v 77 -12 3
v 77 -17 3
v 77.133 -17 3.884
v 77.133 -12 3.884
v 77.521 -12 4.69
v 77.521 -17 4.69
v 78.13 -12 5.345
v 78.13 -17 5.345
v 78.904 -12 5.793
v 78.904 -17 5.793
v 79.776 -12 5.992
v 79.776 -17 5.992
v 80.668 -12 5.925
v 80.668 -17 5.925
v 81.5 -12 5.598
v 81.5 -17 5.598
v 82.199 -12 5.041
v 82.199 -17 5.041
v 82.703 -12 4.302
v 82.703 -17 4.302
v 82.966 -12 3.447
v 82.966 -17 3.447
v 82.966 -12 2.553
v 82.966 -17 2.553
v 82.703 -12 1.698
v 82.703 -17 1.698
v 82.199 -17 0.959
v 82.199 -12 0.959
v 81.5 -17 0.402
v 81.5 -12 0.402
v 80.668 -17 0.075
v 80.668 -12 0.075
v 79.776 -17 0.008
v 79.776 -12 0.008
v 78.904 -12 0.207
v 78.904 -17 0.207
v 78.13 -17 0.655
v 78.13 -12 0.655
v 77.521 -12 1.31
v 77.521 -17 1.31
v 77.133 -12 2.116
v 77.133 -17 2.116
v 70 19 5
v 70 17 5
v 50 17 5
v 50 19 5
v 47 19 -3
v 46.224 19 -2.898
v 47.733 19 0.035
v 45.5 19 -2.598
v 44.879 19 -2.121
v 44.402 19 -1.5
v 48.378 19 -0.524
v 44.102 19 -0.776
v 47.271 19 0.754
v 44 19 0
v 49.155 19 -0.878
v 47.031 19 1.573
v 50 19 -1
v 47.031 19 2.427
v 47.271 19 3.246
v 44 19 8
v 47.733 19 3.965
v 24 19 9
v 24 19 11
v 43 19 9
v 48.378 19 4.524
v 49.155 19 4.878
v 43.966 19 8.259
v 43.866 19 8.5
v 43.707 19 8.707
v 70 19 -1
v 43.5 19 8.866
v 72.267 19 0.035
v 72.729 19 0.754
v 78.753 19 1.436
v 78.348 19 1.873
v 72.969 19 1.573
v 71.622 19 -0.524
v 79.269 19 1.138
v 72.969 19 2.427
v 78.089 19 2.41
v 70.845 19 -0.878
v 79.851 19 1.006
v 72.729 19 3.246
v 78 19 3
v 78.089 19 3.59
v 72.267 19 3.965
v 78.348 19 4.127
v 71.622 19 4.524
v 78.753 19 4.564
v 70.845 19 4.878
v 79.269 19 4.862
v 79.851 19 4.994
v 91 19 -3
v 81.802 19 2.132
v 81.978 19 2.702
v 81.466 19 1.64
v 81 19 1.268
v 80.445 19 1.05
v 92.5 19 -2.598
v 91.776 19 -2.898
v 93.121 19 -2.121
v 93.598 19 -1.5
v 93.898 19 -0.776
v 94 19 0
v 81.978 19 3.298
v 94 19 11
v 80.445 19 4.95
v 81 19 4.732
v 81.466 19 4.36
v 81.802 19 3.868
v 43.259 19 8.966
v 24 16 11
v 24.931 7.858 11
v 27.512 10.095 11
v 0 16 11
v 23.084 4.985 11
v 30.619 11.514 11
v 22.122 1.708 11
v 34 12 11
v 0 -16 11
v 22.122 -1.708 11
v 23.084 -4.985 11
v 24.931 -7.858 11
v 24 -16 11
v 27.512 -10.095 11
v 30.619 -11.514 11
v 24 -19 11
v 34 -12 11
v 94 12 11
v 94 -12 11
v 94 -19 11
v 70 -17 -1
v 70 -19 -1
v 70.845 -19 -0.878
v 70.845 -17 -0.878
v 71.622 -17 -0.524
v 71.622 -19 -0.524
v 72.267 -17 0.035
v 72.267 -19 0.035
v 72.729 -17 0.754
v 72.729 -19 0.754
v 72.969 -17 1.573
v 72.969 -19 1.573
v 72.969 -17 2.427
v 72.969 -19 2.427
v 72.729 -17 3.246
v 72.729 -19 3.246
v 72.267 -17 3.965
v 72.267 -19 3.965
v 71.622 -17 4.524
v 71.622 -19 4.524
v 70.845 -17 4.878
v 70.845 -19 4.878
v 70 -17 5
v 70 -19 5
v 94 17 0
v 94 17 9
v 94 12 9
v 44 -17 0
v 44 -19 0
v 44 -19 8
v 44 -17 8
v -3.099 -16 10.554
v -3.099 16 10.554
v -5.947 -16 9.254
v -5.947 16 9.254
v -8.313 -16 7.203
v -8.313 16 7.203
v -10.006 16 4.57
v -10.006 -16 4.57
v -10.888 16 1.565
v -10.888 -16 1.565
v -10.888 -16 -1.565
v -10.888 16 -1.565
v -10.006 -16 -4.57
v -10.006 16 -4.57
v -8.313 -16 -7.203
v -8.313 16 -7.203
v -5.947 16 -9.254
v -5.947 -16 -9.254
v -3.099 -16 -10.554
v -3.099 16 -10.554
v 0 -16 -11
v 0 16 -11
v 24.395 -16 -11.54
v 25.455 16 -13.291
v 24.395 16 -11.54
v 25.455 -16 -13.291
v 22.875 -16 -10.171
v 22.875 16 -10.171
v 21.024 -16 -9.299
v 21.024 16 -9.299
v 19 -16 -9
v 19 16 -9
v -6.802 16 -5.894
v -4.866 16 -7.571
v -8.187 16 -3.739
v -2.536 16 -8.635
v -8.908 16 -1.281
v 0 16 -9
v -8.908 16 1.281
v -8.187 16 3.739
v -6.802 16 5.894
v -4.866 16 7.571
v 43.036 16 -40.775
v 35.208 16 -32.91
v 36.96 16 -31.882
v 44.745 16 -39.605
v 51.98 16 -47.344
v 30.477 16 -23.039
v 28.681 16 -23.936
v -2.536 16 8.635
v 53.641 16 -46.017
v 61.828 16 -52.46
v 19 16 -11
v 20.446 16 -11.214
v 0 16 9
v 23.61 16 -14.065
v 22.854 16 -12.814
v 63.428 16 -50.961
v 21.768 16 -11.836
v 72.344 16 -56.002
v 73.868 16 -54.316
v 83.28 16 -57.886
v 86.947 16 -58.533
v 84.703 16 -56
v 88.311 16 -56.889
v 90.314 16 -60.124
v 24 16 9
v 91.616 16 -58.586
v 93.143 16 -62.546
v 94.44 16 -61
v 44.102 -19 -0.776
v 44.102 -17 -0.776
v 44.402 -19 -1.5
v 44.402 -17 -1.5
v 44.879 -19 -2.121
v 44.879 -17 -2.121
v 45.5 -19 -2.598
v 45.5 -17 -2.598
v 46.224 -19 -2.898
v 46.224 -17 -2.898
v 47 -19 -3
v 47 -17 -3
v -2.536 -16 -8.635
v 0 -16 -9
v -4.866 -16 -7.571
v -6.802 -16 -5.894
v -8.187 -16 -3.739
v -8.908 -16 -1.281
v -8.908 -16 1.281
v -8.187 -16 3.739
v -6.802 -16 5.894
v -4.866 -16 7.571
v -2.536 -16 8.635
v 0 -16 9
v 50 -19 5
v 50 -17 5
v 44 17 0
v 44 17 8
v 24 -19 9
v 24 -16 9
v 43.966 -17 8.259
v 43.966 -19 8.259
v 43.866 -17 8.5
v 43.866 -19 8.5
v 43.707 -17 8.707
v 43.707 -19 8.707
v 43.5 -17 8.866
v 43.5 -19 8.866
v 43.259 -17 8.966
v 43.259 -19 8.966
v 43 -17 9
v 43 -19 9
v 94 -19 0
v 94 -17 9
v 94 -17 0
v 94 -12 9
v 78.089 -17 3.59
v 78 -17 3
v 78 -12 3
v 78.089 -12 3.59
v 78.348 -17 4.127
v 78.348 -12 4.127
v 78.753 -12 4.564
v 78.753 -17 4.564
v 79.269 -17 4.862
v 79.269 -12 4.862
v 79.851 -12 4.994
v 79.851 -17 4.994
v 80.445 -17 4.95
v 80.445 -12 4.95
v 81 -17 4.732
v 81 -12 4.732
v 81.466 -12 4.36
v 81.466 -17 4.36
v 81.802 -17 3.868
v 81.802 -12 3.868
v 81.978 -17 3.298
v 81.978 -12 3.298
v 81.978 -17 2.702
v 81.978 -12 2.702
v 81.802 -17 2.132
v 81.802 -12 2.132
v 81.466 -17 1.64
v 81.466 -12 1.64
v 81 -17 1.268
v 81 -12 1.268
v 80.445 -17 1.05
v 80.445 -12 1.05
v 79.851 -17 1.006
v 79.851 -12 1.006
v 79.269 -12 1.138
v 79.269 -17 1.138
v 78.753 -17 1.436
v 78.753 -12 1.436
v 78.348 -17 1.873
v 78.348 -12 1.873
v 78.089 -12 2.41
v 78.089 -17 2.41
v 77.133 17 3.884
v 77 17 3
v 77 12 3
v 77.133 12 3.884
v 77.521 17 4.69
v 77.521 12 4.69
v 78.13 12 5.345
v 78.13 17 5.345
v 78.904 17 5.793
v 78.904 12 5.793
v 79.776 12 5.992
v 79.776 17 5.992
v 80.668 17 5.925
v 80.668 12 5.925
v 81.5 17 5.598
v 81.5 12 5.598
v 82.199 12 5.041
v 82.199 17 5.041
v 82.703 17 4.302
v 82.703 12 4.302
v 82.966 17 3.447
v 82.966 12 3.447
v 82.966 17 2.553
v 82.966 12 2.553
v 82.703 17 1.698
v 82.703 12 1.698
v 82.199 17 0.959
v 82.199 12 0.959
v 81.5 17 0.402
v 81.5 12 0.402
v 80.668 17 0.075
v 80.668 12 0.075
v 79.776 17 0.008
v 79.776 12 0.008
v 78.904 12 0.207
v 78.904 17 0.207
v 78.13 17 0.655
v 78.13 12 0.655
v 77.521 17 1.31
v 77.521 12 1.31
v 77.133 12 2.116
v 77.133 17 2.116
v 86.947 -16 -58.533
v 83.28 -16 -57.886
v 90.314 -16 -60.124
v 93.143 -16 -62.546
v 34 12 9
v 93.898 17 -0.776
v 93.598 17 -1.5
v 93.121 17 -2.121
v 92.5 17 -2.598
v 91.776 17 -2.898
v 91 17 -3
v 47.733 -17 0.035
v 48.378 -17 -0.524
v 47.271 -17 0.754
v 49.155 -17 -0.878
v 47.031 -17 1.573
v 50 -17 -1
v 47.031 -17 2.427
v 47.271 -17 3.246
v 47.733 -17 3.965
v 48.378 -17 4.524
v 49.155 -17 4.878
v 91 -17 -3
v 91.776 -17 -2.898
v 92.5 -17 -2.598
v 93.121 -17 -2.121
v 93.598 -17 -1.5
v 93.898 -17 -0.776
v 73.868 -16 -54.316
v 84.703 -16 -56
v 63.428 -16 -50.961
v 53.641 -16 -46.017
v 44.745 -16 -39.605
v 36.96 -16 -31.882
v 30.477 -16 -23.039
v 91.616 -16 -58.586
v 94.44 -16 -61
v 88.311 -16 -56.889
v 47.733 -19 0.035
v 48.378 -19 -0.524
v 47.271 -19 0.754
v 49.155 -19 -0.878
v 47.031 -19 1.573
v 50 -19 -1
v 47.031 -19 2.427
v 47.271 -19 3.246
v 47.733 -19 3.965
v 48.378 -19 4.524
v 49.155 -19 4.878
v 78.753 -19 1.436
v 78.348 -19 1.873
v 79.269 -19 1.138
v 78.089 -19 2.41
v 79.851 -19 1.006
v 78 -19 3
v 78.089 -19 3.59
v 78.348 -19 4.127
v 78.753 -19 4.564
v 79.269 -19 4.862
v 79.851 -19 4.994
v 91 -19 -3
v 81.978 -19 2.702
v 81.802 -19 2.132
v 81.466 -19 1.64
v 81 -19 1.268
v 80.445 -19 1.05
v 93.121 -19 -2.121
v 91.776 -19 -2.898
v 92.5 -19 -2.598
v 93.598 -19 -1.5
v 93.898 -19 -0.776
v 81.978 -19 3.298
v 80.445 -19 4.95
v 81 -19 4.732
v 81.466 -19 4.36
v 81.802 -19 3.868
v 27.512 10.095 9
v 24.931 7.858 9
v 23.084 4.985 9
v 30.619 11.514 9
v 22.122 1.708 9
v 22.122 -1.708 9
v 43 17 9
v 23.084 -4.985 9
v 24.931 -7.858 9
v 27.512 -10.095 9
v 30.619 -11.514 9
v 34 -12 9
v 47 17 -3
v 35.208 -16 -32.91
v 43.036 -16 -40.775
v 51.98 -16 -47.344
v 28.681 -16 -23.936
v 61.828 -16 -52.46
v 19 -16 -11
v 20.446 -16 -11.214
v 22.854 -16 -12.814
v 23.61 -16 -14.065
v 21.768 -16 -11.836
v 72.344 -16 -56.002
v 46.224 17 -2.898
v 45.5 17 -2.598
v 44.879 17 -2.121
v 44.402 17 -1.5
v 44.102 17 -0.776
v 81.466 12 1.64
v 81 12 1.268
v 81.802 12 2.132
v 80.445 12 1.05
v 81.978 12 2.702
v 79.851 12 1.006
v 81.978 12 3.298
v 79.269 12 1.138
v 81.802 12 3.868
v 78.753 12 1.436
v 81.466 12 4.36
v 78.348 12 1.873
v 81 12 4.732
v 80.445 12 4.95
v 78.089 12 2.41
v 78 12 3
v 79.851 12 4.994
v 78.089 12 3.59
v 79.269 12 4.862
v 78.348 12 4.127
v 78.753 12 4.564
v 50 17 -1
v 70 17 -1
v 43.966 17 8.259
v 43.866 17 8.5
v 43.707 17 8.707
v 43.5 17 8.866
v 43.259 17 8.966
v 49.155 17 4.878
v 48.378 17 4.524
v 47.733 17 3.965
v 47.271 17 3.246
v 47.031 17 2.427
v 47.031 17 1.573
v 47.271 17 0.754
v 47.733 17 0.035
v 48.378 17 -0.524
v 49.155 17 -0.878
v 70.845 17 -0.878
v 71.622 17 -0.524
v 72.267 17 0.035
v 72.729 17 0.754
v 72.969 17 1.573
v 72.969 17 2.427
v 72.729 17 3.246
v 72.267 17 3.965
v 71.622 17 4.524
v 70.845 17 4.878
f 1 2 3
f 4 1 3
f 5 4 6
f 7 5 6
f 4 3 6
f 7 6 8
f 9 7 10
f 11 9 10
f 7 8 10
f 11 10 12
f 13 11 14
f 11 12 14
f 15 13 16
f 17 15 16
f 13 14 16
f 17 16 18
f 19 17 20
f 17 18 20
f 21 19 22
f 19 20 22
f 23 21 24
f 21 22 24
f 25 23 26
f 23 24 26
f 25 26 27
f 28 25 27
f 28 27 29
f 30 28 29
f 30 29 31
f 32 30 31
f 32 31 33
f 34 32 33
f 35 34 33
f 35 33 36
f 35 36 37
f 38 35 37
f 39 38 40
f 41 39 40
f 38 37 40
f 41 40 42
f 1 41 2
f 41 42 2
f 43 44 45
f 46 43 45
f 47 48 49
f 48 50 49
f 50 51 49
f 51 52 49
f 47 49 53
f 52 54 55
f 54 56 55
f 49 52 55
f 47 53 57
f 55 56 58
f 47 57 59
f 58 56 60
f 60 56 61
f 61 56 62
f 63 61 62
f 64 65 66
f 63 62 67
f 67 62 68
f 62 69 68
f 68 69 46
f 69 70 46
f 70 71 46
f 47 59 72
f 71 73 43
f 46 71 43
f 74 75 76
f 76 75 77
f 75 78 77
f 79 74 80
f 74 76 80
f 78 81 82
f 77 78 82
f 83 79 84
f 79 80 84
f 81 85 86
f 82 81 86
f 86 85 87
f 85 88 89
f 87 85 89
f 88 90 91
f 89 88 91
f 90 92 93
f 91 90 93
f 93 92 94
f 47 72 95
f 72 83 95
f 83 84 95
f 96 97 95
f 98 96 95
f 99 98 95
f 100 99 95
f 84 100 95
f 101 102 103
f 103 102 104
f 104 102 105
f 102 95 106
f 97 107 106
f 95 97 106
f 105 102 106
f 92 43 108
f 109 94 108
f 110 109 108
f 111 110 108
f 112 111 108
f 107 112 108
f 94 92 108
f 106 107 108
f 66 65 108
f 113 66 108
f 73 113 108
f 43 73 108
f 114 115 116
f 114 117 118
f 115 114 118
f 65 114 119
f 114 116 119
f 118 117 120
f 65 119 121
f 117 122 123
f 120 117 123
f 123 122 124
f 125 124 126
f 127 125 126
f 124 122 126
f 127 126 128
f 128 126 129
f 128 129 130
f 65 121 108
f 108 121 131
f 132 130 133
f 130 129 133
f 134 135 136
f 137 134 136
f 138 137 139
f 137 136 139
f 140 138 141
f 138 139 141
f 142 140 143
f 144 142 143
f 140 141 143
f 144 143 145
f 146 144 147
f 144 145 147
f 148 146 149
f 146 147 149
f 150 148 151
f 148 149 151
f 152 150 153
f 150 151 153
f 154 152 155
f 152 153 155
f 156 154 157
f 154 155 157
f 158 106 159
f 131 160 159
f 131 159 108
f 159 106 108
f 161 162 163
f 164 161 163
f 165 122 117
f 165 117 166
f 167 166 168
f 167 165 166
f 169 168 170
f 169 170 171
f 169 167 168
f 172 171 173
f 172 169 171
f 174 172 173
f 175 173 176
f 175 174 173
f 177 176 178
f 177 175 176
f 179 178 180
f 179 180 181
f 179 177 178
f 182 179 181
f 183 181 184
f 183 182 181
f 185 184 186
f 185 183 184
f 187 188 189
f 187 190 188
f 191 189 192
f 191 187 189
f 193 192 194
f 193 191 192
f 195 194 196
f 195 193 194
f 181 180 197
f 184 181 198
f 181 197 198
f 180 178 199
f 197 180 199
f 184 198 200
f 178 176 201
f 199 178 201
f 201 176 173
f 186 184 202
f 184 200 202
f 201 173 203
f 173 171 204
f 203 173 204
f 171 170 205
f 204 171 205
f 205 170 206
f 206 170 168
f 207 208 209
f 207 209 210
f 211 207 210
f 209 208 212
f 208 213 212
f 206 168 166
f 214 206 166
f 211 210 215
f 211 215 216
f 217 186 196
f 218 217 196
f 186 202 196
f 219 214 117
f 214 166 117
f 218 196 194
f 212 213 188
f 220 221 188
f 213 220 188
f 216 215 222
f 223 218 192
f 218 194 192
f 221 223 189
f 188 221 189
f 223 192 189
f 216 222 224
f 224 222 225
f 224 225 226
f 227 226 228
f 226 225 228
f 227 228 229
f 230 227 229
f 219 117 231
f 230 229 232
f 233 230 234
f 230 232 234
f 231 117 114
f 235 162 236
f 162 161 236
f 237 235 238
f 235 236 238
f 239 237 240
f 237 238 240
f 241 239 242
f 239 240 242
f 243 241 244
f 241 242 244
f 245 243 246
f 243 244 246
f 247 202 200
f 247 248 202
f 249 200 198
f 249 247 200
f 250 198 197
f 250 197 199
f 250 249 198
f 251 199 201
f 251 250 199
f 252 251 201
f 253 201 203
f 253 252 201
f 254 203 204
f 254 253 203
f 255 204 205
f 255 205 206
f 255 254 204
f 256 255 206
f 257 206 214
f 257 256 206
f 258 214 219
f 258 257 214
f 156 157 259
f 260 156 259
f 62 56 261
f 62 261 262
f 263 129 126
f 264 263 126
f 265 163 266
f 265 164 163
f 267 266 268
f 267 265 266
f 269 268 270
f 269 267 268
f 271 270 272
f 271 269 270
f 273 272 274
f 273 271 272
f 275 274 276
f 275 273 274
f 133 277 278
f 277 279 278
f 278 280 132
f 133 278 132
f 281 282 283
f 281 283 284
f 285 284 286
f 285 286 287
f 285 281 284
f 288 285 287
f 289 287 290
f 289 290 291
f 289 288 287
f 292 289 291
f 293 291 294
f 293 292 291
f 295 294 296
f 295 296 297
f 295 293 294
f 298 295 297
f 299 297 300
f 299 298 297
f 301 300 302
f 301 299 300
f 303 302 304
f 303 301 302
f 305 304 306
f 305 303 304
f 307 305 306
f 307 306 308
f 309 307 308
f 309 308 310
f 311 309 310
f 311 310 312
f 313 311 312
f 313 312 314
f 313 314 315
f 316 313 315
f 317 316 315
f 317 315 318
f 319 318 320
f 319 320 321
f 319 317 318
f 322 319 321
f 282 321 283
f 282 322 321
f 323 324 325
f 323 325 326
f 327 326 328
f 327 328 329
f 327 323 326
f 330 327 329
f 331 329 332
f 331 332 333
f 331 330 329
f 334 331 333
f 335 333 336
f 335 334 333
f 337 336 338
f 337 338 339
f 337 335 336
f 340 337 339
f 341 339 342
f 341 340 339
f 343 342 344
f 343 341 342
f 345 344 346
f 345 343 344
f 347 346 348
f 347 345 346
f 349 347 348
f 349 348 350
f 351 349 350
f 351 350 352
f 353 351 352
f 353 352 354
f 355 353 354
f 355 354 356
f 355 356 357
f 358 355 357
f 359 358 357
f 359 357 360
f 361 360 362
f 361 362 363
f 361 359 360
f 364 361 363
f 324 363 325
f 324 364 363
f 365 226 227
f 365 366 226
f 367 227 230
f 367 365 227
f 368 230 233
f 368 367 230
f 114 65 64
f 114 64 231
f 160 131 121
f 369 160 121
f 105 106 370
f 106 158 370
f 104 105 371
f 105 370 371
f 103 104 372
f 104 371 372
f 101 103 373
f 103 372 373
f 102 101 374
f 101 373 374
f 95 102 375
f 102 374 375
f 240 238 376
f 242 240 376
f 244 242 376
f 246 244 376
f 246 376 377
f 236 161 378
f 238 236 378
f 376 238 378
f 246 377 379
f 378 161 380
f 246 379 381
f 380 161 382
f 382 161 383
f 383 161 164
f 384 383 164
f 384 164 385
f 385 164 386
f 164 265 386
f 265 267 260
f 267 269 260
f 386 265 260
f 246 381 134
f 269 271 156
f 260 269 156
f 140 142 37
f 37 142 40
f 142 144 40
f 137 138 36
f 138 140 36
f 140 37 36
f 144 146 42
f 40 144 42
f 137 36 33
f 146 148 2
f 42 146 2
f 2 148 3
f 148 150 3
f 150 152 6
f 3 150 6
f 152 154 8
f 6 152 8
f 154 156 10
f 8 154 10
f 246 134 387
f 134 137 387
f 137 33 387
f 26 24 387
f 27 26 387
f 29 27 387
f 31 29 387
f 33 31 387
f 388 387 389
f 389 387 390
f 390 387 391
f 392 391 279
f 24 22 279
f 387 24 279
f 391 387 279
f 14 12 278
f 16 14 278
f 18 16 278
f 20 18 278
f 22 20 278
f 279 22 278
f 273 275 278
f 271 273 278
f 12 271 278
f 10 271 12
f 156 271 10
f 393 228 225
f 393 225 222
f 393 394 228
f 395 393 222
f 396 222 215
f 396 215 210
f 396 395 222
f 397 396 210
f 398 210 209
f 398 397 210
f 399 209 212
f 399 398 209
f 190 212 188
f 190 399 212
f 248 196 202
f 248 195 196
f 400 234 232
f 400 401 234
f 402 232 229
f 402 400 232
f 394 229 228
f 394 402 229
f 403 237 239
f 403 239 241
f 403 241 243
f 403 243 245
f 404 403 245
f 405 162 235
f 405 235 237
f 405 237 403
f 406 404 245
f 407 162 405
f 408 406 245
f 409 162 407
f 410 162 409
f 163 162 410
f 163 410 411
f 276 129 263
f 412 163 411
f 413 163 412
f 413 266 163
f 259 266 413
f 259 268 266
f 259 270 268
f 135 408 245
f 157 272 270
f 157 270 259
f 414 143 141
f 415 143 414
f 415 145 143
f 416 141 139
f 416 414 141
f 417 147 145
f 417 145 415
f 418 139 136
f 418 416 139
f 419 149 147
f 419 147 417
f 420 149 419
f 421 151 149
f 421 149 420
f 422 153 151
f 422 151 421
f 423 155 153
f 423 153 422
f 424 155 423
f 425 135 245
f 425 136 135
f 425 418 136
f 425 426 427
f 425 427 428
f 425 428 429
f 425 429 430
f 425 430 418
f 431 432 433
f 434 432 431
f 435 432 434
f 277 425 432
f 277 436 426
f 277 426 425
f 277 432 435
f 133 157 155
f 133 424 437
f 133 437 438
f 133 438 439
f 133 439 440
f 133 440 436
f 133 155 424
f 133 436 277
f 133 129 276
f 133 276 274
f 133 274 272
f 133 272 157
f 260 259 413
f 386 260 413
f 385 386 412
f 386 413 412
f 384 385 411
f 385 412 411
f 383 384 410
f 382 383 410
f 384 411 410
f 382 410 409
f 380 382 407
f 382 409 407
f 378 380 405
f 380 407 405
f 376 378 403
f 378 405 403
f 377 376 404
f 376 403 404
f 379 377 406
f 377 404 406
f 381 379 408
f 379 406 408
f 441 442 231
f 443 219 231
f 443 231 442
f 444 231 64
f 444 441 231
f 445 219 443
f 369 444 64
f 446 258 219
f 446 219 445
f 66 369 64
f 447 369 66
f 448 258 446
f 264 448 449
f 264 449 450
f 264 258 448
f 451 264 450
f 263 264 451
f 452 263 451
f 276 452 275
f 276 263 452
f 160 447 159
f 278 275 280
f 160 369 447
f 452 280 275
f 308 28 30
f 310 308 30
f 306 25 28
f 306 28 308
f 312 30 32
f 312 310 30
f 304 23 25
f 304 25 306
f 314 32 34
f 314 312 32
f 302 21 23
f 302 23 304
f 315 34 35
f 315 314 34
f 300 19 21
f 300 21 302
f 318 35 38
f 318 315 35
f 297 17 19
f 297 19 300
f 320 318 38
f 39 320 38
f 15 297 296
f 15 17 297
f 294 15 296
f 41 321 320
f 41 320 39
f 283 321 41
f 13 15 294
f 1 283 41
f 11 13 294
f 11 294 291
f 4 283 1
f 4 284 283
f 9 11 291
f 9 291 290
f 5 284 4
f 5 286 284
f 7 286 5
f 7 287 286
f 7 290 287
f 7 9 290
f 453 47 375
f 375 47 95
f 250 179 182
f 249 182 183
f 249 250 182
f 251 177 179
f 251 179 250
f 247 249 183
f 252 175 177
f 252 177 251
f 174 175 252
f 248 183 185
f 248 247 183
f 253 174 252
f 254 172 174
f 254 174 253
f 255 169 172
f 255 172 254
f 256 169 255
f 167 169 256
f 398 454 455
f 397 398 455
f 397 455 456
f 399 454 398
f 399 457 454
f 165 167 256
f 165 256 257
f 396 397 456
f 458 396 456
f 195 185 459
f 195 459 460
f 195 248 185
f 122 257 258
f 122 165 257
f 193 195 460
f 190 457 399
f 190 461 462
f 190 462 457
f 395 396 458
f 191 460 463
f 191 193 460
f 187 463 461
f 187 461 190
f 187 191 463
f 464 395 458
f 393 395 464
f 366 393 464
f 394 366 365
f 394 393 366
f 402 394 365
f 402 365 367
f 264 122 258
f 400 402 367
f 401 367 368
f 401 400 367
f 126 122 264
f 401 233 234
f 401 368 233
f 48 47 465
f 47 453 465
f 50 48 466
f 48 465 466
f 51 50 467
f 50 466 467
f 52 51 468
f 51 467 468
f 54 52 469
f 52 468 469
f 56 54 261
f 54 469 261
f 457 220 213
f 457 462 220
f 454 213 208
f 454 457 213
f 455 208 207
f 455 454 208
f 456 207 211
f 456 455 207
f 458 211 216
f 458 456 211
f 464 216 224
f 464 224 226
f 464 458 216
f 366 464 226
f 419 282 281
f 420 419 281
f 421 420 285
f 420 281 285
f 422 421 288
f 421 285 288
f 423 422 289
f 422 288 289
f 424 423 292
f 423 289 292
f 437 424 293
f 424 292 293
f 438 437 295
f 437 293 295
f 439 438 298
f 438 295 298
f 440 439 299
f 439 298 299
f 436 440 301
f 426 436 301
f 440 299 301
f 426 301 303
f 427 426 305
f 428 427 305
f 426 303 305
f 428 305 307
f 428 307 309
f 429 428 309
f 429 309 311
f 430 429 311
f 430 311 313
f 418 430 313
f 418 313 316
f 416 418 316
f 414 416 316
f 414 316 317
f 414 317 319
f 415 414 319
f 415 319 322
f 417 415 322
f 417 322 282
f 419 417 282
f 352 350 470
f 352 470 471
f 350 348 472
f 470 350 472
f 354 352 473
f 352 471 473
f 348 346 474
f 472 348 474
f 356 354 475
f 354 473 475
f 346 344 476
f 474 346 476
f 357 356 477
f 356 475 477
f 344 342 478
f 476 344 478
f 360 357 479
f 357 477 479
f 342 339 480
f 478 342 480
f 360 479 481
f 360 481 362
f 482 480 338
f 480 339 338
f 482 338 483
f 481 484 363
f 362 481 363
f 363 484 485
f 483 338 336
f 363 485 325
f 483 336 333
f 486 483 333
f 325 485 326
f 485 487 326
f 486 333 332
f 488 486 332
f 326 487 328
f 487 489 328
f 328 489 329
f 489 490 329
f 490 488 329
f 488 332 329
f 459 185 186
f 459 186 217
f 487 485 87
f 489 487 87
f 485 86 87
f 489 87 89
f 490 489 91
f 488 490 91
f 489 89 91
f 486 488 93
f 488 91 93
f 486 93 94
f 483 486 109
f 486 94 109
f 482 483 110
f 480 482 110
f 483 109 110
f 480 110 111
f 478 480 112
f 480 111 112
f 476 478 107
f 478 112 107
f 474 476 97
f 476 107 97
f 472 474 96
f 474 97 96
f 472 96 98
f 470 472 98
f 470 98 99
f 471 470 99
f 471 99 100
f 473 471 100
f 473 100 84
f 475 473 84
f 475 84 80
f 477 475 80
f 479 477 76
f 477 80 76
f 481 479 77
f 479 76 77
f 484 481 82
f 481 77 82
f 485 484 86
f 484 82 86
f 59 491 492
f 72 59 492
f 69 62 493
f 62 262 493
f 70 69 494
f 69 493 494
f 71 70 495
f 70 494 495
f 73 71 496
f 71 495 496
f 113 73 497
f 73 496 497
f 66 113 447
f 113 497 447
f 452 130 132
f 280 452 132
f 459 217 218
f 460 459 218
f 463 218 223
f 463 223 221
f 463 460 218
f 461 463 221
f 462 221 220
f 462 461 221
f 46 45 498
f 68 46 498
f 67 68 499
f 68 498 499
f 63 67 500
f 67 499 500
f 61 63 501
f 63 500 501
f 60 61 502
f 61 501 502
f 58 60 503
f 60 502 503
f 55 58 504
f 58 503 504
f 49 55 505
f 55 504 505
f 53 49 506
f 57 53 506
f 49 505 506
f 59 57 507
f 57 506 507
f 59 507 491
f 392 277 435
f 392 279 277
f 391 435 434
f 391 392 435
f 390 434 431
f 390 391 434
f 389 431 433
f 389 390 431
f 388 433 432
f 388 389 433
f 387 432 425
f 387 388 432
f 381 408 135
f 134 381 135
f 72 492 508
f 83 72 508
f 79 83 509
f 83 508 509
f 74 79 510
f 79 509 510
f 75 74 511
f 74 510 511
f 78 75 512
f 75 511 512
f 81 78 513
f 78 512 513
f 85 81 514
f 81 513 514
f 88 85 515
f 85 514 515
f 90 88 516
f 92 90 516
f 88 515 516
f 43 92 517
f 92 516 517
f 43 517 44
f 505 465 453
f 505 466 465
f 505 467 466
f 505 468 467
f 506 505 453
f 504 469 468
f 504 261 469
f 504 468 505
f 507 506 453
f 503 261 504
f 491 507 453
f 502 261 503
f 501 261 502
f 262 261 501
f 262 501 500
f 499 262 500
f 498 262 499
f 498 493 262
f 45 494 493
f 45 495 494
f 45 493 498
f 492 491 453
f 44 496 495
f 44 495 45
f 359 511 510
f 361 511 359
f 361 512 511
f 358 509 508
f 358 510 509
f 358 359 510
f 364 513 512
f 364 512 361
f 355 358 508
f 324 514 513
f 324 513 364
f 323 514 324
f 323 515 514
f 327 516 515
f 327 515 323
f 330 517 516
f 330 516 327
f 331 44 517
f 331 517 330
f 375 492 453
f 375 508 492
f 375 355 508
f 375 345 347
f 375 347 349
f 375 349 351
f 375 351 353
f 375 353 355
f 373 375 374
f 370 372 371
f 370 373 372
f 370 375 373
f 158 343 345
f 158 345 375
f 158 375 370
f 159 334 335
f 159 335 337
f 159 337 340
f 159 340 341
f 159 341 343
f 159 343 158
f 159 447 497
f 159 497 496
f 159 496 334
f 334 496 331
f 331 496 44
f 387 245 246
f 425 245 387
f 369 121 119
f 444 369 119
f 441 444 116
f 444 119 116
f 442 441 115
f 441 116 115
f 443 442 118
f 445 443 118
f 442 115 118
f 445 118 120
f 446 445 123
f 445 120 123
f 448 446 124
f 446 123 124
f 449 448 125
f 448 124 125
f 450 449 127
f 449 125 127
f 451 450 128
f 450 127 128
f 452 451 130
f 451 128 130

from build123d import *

# Parameters (mm, degrees)
F1_DEPTH  = 16
F2_W      = 70
F2_H      = 3
F3_DEPTH  = 2
F4_W      = 50
F4_H      = 14
F5_DEPTH  = 2
F6_R      = 1
F9_DEPTH  = 2
F11_DEPTH = 38.001
F13_D     = 4
F14_R     = 3
F14_R_2   = 2
F15_DEPTH = 5
F16_R     = 3


# Not quite as in the source:
# - a pattern or mirror of a feature is missing from the dataset's text; its kind, count and spacing are read off the source's solid


with BuildPart() as f1:
    # F0 (on Front) → F1 (new body)
    with BuildSketch(Plane.XZ):
        with BuildLine():
            Line((94, 11), (0, 11))
            ThreePointArc((0, 11), (-11, 0), (0, -11))
            Line((0, -11), (19, -11))
            ThreePointArc((19, -11), (21.7681124643, -11.8361612201), (23.6103896104, -14.064978646))
            ThreePointArc((23.6103896104, -14.064978646), (47.381548553, -44.2322797447), (83.2800086179, -57.8863860143))
            ThreePointArc((83.2800086179, -57.8863860143), (88.6838234672, -59.2161173312), (93.142692854, -62.5459647892))
            Line((93.142692854, -62.5459647892), (94.4399113384, -61))
            ThreePointArc((94.4399113384, -61), (90.012513527, -57.6415445278), (84.7034264019, -56))
            ThreePointArc((84.7034264019, -56), (49.0672193413, -42.9854179344), (25.4545454545, -13.2909701044))
            ThreePointArc((25.4545454545, -13.2909701044), (22.87535745, -10.1706257081), (19, -9))
            Line((19, -9), (0, -9))
            ThreePointArc((0, -9), (-9, 0), (0, 9))
            Line((0, 9), (94, 9))
            Line((94, 9), (94, 11))
        make_face()
    extrude(amount=F1_DEPTH)

    # F2 (on face) → F3 (join)
    with BuildSketch(Plane.XY.offset(11)):
        with Locations((59, -17.5)):
            Rectangle(F2_W, F2_H)
    extrude(amount=-F3_DEPTH)

    # F4 (on face) → F5 (join)
    with BuildSketch(Plane.XZ.offset(19)):
        with Locations((69, 4)):
            Rectangle(F4_W, F4_H)
    extrude(amount=-F5_DEPTH)

    # F6
    f6_edges = [f1.edges().sort_by_distance(p)[0] for p in [
        (44, -18, 9),
    ]]
    fillet(f6_edges, radius=F6_R)

    # F7: F1 across plane


with BuildPart() as f1_1:
    add(f1.part)
    add(f1.part.mirror(Plane.XZ))

    # F8 (on face) → F9 (cut)
    with BuildSketch(Plane.XY.offset(11)):
        with BuildLine():
            Line((94, 12), (34, 12))
            ThreePointArc((34, 12), (22, 0), (34, -12))
            Line((34, -12), (94, -12))
            Line((94, -12), (94, 12))
        make_face()
    extrude(amount=-F9_DEPTH, mode=Mode.SUBTRACT)

    # F10 (on face) → F11 (cut, through all)
    with BuildSketch(Plane.XZ.offset(19)):
        with BuildLine():
            ThreePointArc((50, 5), (47, 2), (50, -1))
            Line((50, -1), (70, -1))
            ThreePointArc((70, -1), (73, 2), (70, 5))
            Line((70, 5), (50, 5))
        make_face()
    extrude(amount=-F11_DEPTH, mode=Mode.SUBTRACT)

    # F13 (through all)
    with Locations(Plane.XZ.offset(19)):
        with Locations((80, 3)):
            Hole(F13_D / 2)

    # F14 (on face) → F15 (join)
    with BuildSketch(Plane(origin=(0, -17, 0), x_dir=(-1, 0, 0), z_dir=(0, 1, 0))):
        with Locations((-80, 3)):
            Circle(F14_R)
        with Locations((-80, 3)):
            Circle(F14_R_2, mode=Mode.SUBTRACT)
    f15 = extrude(amount=F15_DEPTH)

    # F15_copies: F15 across plane
    add(f15.mirror(Plane.ZX))

    # F16
    f16_edges = [f1_1.edges().sort_by_distance(p)[0] for p in [
        (94, -18, -3),
        (44, -18, -3),
        (94, 18, -3),
        (44, 18, -3),
    ]]
    fillet(f16_edges, radius=F16_R)


solid = f1_1.part
